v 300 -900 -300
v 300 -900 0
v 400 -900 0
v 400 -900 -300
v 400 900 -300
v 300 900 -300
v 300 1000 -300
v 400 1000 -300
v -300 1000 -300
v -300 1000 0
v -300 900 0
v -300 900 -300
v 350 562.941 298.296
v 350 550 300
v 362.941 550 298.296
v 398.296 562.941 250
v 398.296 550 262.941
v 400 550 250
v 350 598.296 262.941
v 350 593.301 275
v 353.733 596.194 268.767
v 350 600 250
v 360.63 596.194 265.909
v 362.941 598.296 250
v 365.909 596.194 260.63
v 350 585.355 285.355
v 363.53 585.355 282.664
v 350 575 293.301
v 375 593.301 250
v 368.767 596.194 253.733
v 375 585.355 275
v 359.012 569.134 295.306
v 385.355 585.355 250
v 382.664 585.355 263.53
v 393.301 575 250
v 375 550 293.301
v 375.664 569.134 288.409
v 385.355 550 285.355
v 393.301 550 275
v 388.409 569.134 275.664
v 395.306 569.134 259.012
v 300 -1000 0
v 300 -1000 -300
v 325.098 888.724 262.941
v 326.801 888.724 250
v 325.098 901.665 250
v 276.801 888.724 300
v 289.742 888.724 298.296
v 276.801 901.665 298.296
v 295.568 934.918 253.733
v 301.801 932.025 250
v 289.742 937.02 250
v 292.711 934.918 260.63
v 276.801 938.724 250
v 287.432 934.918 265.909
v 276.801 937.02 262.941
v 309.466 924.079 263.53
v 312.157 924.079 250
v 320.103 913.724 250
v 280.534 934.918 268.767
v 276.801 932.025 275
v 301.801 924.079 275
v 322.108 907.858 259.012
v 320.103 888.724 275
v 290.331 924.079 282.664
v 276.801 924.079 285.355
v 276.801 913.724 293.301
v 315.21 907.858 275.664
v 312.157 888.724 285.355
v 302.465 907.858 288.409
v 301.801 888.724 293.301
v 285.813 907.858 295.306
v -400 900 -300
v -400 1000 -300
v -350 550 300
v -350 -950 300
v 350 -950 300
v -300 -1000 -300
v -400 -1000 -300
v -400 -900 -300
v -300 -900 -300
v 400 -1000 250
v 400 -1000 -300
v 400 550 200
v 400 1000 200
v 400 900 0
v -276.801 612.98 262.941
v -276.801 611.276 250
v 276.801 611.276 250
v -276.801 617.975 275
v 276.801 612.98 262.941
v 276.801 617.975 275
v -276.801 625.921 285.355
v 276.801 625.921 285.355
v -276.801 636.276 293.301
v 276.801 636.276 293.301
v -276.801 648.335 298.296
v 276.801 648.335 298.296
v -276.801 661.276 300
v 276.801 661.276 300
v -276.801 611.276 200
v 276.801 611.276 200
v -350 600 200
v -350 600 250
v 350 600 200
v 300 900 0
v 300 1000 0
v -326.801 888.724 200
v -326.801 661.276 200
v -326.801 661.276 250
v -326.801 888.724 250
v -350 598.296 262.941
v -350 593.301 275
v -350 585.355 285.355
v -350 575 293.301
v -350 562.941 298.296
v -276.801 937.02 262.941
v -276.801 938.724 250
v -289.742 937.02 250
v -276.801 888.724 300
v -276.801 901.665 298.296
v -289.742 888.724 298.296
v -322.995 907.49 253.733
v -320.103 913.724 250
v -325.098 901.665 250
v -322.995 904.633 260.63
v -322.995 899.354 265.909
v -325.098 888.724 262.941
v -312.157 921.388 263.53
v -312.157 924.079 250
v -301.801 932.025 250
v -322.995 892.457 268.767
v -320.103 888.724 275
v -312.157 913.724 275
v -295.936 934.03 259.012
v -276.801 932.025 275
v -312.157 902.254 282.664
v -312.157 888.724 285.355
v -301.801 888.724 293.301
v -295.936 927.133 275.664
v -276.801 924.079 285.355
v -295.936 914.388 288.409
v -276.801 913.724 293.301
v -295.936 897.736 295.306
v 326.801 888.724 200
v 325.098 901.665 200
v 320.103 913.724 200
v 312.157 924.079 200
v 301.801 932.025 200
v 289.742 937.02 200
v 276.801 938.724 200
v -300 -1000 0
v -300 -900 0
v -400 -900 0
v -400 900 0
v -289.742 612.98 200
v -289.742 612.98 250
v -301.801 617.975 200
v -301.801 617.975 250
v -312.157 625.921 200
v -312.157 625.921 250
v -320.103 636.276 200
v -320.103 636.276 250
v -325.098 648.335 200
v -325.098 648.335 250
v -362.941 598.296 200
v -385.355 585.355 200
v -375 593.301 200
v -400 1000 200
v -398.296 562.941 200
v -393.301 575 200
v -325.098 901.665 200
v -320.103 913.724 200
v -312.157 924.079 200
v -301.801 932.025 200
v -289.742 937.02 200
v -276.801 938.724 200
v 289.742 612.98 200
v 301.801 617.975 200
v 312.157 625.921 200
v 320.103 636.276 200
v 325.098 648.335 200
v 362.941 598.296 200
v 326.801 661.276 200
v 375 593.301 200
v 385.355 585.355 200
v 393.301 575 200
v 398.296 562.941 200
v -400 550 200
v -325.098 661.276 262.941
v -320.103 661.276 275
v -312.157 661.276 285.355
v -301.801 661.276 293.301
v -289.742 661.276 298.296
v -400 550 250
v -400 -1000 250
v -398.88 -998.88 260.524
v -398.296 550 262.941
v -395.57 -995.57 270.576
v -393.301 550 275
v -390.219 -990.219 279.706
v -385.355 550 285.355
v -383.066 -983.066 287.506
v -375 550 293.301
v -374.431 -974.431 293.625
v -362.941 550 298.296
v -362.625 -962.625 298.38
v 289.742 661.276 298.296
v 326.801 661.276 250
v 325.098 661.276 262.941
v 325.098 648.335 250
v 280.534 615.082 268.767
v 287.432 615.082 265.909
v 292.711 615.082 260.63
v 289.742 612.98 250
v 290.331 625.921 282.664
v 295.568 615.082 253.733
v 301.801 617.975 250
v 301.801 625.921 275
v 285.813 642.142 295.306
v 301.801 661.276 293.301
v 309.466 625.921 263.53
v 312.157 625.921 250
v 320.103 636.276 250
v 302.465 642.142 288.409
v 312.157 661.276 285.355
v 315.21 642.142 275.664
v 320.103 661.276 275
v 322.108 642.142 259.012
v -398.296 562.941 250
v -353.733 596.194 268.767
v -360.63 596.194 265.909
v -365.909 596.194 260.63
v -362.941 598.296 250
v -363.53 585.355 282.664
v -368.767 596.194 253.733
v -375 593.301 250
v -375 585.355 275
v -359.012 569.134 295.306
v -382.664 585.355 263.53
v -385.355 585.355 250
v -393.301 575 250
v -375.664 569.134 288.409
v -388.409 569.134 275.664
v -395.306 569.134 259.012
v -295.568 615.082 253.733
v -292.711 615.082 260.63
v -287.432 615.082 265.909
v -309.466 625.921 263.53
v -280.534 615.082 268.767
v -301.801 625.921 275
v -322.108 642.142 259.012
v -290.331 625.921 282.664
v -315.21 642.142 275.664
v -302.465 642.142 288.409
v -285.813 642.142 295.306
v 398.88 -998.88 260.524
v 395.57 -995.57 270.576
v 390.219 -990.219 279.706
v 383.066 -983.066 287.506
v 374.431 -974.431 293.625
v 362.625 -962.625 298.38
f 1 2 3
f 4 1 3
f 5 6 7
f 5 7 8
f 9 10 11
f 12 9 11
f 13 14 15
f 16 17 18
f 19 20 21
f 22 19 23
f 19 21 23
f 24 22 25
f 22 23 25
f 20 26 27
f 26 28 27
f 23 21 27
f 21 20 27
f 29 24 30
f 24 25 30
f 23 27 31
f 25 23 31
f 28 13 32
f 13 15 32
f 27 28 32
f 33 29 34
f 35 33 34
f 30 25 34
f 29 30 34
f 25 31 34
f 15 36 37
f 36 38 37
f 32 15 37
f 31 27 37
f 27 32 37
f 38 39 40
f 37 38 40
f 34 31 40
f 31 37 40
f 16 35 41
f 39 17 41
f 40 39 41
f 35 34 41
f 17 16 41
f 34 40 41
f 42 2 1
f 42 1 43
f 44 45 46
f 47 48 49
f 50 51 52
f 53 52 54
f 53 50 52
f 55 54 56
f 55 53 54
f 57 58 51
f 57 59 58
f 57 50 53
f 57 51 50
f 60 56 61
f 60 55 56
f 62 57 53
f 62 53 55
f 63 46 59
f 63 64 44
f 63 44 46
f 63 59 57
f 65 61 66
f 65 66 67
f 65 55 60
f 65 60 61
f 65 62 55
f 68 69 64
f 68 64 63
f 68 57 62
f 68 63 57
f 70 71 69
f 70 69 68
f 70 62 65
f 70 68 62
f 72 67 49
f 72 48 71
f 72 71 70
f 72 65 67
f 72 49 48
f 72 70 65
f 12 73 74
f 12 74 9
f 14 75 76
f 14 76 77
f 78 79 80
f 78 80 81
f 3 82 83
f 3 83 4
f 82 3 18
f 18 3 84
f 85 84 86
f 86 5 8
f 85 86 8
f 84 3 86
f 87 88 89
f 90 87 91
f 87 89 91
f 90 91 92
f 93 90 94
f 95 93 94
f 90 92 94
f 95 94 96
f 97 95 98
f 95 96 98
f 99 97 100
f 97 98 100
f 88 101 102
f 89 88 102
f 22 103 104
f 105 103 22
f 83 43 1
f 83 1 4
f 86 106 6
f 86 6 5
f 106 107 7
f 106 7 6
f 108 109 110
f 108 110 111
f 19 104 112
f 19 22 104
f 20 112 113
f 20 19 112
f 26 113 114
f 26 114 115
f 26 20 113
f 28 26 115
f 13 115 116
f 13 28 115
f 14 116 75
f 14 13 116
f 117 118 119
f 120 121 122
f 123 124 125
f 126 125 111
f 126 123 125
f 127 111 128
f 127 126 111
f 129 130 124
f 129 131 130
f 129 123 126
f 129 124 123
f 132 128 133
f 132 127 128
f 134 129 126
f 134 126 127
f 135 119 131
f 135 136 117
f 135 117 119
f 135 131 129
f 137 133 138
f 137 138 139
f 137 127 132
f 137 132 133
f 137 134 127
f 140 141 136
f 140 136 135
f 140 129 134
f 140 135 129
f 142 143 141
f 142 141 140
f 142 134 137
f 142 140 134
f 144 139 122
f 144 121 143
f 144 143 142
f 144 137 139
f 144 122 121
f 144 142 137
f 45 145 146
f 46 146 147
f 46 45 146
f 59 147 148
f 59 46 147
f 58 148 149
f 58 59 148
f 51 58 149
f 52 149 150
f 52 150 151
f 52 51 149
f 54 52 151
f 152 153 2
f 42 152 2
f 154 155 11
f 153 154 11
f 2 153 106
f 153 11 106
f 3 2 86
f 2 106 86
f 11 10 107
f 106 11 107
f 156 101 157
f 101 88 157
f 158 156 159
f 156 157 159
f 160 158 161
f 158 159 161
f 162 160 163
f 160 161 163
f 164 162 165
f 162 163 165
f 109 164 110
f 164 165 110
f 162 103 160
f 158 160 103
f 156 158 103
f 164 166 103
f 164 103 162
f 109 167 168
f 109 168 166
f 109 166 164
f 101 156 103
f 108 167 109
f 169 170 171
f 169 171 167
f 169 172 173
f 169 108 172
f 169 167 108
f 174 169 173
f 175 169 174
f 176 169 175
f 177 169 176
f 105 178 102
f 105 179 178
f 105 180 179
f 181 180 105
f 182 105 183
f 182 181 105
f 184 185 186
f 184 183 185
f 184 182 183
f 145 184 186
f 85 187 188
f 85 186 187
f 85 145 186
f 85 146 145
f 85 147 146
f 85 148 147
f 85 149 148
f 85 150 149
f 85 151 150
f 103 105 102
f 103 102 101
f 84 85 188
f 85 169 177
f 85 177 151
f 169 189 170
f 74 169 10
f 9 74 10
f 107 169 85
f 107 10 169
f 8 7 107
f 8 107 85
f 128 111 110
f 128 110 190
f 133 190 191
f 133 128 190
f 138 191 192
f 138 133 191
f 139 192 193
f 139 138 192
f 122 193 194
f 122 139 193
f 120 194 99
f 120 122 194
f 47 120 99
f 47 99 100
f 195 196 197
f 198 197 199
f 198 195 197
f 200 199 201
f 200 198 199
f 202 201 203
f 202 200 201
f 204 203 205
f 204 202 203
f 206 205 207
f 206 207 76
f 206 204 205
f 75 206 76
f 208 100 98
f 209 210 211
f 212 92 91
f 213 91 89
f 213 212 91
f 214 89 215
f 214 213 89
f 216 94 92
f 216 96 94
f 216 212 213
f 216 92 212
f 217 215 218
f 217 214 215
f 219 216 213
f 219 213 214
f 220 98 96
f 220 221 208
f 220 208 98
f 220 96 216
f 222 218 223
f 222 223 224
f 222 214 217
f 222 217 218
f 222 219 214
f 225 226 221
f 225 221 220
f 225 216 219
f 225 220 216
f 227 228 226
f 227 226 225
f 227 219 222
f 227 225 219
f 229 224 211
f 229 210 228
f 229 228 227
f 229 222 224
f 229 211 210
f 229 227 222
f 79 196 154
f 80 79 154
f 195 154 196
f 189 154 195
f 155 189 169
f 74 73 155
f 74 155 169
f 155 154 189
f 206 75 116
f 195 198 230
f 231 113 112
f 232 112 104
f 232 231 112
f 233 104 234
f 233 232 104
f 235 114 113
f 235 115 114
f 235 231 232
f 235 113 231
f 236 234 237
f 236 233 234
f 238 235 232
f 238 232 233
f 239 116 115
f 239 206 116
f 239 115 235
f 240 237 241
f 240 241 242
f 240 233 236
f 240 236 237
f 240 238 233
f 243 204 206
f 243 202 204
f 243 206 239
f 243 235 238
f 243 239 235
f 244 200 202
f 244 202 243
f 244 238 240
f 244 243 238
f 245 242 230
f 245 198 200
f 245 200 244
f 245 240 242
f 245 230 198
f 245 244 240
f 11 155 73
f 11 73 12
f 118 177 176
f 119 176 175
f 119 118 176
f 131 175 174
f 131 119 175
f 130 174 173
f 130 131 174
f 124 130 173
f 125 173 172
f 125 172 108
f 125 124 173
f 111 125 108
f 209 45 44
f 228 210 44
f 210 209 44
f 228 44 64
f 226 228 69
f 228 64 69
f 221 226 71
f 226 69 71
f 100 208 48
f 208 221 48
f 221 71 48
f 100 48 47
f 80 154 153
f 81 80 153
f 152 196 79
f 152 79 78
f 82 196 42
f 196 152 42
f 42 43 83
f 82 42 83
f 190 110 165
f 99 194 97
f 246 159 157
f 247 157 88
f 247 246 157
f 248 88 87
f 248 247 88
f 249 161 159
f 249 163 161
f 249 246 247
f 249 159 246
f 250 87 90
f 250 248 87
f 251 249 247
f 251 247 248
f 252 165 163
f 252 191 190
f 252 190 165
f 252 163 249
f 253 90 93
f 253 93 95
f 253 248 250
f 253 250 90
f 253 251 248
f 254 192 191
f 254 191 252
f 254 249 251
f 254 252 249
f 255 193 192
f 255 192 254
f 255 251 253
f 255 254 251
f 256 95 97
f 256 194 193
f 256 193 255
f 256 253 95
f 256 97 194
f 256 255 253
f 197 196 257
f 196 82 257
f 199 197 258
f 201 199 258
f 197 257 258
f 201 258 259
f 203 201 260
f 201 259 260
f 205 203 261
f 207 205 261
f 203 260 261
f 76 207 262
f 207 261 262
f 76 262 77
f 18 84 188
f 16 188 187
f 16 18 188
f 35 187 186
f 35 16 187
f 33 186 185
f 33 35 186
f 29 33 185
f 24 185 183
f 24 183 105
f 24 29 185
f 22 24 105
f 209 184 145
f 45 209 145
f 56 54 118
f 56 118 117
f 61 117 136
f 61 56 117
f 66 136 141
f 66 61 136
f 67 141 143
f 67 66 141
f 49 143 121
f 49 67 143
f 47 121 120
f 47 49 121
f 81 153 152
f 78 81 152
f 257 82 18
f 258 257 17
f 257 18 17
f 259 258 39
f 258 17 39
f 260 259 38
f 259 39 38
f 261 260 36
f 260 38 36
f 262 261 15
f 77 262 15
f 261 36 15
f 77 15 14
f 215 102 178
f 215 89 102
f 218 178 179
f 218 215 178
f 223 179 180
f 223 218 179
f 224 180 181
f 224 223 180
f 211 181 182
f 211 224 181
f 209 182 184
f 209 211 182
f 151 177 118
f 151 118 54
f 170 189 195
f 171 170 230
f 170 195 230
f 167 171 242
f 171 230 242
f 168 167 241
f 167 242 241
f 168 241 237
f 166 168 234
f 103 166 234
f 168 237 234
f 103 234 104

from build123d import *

# Parameters (mm, degrees)
F0_W     = 800
F0_H     = 2000
F1_DEPTH = 200
F2_W     = 100
F2_H     = 100
F3_DEPTH = 300
F4_W     = 800
F4_H     = 1600
F5_DEPTH = 100
F6_R     = 50
F7_W     = 653.6028981209
F7_H     = 327.4476051331
F8_DEPTH = 100
F9_R     = 50


with BuildPart() as f1:
    # F0 (on Top) → F1 (new body)
    with BuildSketch(Plane.XY):
        Rectangle(F0_W, F0_H)
    extrude(amount=F1_DEPTH)

    # F2 (on face) → F3 (join)
    with BuildSketch(Plane(origin=(0, 0, 0), x_dir=(1, 0, 0), z_dir=(0, 0, -1))):
        with Locations((350, 950)):
            Rectangle(F2_W, F2_H)
        with Locations((-350, 950)):
            Rectangle(F2_W, F2_H)
        with Locations((-350, -950)):
            Rectangle(F2_W, F2_H)
        with Locations((350, -950)):
            Rectangle(F2_W, F2_H)
    extrude(amount=F3_DEPTH)

    # F4 (on face) → F5 (join)
    with BuildSketch(Plane.XY.offset(200)):
        with Locations((0, -200)):
            Rectangle(F4_W, F4_H)
    extrude(amount=F5_DEPTH)

    # F6
    f6_edges = [f1.edges().sort_by_distance(p)[0] for p in [
        (400, -200, 300),
        (0, -1000, 300),
        (-400, -200, 300),
        (0, 600, 300),
        (400, 600, 250),
        (-400, 600, 250),
    ]]
    fillet(f6_edges, radius=F6_R)

    # F7 (on face) → F8 (join)
    with BuildSketch(Plane.XY.offset(200)):
        with Locations((0, 775)):
            Rectangle(F7_W, F7_H)
    extrude(amount=F8_DEPTH)

    # F9
    f9_edges = [f1.edges().sort_by_distance(p)[0] for p in [
        (326.801449, 775, 300),
        (326.801449, 938.723803, 250),
        (0, 938.723803, 300),
        (-326.801449, 938.723803, 250),
        (-326.801449, 775, 300),
        (-326.801449, 611.276197, 250),
        (0, 611.276197, 300),
        (326.801449, 611.276197, 250),
    ]]
    fillet(f9_edges, radius=F9_R)


solid = f1.part
